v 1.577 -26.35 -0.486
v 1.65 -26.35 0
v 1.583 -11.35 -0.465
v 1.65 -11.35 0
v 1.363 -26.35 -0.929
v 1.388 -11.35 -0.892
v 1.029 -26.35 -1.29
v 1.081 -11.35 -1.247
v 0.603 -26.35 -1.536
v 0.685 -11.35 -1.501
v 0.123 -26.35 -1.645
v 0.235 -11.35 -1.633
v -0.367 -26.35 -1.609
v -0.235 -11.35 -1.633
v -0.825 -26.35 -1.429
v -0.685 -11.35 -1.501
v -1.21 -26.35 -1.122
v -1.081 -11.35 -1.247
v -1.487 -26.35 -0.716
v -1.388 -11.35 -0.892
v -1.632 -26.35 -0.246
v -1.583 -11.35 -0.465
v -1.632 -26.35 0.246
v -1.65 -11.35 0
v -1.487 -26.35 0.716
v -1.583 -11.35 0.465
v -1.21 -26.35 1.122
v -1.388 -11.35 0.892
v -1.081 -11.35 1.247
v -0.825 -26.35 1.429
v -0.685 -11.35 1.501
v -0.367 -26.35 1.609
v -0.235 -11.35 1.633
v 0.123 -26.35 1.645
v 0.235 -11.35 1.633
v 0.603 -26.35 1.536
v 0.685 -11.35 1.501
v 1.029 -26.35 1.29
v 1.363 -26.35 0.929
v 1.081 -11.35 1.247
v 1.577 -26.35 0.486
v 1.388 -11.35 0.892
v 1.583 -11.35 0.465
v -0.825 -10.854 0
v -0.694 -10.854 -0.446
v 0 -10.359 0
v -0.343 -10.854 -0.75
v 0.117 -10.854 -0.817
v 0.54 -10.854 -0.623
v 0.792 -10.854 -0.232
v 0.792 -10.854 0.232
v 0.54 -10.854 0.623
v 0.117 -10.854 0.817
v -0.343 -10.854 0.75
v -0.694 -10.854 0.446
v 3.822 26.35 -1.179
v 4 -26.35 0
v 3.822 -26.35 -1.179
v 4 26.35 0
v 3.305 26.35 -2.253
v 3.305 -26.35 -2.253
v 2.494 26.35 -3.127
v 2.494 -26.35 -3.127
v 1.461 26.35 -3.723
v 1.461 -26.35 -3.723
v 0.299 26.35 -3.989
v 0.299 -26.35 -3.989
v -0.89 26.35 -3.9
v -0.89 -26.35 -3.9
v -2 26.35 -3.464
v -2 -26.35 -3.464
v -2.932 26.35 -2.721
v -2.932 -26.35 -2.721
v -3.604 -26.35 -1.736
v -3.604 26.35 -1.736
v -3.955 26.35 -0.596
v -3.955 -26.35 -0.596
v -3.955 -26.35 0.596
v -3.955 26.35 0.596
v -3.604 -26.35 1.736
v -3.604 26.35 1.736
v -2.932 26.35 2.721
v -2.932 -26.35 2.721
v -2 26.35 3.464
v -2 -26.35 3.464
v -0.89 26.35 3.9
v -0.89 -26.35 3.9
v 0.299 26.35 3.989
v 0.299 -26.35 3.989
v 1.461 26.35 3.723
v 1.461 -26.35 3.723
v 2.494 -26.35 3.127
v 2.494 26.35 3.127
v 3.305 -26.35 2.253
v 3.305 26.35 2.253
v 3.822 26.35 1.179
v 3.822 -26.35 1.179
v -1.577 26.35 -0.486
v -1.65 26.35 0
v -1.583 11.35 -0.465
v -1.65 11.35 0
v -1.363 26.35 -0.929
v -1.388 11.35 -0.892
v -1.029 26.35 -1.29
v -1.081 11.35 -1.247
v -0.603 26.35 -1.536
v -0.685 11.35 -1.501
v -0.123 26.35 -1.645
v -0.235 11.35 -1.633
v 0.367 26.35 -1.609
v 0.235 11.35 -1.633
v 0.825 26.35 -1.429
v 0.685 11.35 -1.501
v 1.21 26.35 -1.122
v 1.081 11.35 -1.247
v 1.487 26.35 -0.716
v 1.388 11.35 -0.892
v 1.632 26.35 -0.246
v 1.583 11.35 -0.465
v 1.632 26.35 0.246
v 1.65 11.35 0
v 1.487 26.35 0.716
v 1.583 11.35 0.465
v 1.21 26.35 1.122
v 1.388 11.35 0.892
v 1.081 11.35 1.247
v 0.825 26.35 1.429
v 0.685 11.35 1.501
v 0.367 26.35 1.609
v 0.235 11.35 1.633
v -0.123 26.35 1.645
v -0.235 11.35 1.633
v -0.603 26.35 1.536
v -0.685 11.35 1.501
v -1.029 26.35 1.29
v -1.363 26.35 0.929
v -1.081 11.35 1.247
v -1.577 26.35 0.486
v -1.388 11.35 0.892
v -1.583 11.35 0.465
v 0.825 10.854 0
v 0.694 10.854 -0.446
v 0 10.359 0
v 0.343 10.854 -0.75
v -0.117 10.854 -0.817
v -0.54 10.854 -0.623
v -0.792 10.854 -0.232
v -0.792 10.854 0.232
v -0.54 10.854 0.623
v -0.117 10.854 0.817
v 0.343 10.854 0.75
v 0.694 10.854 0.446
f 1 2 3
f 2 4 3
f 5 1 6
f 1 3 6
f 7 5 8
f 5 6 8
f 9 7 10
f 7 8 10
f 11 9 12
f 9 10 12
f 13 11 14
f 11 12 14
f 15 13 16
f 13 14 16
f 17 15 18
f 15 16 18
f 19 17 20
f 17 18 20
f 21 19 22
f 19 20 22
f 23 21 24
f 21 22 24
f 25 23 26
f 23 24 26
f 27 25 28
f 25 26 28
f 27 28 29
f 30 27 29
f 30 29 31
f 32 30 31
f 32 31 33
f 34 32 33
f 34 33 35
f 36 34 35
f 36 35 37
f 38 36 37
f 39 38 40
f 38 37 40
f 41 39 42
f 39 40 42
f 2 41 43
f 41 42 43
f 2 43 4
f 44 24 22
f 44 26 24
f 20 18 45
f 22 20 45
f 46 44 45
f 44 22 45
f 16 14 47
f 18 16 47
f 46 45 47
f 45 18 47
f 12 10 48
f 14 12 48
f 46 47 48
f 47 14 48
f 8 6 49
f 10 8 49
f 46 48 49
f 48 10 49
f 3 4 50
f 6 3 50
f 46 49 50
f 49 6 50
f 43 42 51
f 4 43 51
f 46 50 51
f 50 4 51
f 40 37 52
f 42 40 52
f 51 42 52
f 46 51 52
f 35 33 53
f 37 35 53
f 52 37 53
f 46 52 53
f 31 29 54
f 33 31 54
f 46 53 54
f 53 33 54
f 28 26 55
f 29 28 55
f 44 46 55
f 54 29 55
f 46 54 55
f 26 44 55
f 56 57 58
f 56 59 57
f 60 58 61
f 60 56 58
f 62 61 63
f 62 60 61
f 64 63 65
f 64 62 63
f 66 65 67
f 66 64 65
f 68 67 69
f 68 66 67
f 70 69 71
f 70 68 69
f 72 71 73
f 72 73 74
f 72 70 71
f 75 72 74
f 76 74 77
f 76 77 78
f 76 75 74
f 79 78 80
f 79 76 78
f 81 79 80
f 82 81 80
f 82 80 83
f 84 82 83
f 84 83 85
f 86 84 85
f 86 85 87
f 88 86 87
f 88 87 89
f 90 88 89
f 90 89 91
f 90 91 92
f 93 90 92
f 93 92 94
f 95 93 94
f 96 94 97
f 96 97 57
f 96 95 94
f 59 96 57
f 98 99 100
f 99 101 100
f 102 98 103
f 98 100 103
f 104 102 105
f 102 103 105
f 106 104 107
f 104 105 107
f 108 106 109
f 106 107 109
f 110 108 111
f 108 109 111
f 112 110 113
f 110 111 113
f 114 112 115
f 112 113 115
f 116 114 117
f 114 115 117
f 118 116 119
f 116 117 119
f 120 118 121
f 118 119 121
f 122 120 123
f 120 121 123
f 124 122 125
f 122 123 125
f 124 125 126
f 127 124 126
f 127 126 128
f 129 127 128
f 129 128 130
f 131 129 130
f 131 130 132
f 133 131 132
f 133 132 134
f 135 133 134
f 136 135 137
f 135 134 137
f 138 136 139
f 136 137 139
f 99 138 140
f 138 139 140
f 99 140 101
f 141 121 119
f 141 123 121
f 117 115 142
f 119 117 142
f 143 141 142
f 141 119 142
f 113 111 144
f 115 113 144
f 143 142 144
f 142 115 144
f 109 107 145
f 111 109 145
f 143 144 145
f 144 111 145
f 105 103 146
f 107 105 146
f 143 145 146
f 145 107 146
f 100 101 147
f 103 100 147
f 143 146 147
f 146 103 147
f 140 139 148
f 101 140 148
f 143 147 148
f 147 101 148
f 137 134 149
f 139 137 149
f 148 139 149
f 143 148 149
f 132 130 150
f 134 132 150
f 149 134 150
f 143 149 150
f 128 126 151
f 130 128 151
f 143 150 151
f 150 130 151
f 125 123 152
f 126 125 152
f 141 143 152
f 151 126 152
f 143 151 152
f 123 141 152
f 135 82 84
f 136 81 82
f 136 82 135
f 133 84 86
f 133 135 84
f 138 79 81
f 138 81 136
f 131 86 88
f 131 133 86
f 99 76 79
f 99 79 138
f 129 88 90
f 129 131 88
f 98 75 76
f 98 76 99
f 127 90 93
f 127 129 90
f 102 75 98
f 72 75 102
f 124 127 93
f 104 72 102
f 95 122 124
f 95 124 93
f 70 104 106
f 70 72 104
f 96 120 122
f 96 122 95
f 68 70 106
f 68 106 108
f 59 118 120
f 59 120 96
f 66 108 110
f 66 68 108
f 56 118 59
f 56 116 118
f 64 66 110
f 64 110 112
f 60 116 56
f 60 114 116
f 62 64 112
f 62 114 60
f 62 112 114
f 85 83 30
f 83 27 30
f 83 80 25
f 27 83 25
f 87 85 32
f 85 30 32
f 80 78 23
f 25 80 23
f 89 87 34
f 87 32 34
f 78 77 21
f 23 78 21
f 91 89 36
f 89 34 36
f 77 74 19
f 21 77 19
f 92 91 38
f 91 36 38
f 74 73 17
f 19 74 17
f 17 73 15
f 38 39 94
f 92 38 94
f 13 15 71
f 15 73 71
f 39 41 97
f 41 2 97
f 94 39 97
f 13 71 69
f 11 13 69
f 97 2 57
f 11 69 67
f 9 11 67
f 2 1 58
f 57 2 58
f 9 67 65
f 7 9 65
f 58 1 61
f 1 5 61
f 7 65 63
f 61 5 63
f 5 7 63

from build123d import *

# Parameters (mm, degrees)
SKETCH1_R                 = 4
BOSS_EXTRUDE1_DEPTH       = 26.35
M4X0_7_TAPPED_HOLE1_D     = 3.3
M4X0_7_TAPPED_HOLE1_DEPTH = 15
M4X0_7_TAPPED_HOLE1_TIP   = 0.991420021
M4X0_7_TAPPED_HOLE2_D     = 3.3
M4X0_7_TAPPED_HOLE2_DEPTH = 15
M4X0_7_TAPPED_HOLE2_TIP   = 0.991420021


with BuildPart() as part:
    # Sketch1 → Boss-Extrude1 (new body, symmetric)
    with BuildSketch(Plane(origin=(0, 0, 0), x_dir=(1, 0, 0), z_dir=(0, 1, 0))):
        Circle(SKETCH1_R)
    extrude(amount=BOSS_EXTRUDE1_DEPTH, both=True)

    # M4x0.7 Tapped Hole1
    with Locations(Plane(origin=(0, 26.35, 0), x_dir=(1, 0, 0), z_dir=(0, 1, 0))):
        with Locations((0, 0)):
            Hole(M4X0_7_TAPPED_HOLE1_D / 2, depth=M4X0_7_TAPPED_HOLE1_DEPTH)
            with Locations((0, 0, -(M4X0_7_TAPPED_HOLE1_DEPTH + M4X0_7_TAPPED_HOLE1_TIP / 2))):  # 118° drill point
                Cone(0, M4X0_7_TAPPED_HOLE1_D / 2, M4X0_7_TAPPED_HOLE1_TIP, mode=Mode.SUBTRACT)

    # M4x0.7 Tapped Hole2
    with Locations(Plane(origin=(0, -26.35, 0), x_dir=(-1, 0, 0), z_dir=(0, -1, 0))):
        with Locations((0, 0)):
            Hole(M4X0_7_TAPPED_HOLE2_D / 2, depth=M4X0_7_TAPPED_HOLE2_DEPTH)
            with Locations((0, 0, -(M4X0_7_TAPPED_HOLE2_DEPTH + M4X0_7_TAPPED_HOLE2_TIP / 2))):  # 118° drill point
                Cone(0, M4X0_7_TAPPED_HOLE2_D / 2, M4X0_7_TAPPED_HOLE2_TIP, mode=Mode.SUBTRACT)


solid = part.part
